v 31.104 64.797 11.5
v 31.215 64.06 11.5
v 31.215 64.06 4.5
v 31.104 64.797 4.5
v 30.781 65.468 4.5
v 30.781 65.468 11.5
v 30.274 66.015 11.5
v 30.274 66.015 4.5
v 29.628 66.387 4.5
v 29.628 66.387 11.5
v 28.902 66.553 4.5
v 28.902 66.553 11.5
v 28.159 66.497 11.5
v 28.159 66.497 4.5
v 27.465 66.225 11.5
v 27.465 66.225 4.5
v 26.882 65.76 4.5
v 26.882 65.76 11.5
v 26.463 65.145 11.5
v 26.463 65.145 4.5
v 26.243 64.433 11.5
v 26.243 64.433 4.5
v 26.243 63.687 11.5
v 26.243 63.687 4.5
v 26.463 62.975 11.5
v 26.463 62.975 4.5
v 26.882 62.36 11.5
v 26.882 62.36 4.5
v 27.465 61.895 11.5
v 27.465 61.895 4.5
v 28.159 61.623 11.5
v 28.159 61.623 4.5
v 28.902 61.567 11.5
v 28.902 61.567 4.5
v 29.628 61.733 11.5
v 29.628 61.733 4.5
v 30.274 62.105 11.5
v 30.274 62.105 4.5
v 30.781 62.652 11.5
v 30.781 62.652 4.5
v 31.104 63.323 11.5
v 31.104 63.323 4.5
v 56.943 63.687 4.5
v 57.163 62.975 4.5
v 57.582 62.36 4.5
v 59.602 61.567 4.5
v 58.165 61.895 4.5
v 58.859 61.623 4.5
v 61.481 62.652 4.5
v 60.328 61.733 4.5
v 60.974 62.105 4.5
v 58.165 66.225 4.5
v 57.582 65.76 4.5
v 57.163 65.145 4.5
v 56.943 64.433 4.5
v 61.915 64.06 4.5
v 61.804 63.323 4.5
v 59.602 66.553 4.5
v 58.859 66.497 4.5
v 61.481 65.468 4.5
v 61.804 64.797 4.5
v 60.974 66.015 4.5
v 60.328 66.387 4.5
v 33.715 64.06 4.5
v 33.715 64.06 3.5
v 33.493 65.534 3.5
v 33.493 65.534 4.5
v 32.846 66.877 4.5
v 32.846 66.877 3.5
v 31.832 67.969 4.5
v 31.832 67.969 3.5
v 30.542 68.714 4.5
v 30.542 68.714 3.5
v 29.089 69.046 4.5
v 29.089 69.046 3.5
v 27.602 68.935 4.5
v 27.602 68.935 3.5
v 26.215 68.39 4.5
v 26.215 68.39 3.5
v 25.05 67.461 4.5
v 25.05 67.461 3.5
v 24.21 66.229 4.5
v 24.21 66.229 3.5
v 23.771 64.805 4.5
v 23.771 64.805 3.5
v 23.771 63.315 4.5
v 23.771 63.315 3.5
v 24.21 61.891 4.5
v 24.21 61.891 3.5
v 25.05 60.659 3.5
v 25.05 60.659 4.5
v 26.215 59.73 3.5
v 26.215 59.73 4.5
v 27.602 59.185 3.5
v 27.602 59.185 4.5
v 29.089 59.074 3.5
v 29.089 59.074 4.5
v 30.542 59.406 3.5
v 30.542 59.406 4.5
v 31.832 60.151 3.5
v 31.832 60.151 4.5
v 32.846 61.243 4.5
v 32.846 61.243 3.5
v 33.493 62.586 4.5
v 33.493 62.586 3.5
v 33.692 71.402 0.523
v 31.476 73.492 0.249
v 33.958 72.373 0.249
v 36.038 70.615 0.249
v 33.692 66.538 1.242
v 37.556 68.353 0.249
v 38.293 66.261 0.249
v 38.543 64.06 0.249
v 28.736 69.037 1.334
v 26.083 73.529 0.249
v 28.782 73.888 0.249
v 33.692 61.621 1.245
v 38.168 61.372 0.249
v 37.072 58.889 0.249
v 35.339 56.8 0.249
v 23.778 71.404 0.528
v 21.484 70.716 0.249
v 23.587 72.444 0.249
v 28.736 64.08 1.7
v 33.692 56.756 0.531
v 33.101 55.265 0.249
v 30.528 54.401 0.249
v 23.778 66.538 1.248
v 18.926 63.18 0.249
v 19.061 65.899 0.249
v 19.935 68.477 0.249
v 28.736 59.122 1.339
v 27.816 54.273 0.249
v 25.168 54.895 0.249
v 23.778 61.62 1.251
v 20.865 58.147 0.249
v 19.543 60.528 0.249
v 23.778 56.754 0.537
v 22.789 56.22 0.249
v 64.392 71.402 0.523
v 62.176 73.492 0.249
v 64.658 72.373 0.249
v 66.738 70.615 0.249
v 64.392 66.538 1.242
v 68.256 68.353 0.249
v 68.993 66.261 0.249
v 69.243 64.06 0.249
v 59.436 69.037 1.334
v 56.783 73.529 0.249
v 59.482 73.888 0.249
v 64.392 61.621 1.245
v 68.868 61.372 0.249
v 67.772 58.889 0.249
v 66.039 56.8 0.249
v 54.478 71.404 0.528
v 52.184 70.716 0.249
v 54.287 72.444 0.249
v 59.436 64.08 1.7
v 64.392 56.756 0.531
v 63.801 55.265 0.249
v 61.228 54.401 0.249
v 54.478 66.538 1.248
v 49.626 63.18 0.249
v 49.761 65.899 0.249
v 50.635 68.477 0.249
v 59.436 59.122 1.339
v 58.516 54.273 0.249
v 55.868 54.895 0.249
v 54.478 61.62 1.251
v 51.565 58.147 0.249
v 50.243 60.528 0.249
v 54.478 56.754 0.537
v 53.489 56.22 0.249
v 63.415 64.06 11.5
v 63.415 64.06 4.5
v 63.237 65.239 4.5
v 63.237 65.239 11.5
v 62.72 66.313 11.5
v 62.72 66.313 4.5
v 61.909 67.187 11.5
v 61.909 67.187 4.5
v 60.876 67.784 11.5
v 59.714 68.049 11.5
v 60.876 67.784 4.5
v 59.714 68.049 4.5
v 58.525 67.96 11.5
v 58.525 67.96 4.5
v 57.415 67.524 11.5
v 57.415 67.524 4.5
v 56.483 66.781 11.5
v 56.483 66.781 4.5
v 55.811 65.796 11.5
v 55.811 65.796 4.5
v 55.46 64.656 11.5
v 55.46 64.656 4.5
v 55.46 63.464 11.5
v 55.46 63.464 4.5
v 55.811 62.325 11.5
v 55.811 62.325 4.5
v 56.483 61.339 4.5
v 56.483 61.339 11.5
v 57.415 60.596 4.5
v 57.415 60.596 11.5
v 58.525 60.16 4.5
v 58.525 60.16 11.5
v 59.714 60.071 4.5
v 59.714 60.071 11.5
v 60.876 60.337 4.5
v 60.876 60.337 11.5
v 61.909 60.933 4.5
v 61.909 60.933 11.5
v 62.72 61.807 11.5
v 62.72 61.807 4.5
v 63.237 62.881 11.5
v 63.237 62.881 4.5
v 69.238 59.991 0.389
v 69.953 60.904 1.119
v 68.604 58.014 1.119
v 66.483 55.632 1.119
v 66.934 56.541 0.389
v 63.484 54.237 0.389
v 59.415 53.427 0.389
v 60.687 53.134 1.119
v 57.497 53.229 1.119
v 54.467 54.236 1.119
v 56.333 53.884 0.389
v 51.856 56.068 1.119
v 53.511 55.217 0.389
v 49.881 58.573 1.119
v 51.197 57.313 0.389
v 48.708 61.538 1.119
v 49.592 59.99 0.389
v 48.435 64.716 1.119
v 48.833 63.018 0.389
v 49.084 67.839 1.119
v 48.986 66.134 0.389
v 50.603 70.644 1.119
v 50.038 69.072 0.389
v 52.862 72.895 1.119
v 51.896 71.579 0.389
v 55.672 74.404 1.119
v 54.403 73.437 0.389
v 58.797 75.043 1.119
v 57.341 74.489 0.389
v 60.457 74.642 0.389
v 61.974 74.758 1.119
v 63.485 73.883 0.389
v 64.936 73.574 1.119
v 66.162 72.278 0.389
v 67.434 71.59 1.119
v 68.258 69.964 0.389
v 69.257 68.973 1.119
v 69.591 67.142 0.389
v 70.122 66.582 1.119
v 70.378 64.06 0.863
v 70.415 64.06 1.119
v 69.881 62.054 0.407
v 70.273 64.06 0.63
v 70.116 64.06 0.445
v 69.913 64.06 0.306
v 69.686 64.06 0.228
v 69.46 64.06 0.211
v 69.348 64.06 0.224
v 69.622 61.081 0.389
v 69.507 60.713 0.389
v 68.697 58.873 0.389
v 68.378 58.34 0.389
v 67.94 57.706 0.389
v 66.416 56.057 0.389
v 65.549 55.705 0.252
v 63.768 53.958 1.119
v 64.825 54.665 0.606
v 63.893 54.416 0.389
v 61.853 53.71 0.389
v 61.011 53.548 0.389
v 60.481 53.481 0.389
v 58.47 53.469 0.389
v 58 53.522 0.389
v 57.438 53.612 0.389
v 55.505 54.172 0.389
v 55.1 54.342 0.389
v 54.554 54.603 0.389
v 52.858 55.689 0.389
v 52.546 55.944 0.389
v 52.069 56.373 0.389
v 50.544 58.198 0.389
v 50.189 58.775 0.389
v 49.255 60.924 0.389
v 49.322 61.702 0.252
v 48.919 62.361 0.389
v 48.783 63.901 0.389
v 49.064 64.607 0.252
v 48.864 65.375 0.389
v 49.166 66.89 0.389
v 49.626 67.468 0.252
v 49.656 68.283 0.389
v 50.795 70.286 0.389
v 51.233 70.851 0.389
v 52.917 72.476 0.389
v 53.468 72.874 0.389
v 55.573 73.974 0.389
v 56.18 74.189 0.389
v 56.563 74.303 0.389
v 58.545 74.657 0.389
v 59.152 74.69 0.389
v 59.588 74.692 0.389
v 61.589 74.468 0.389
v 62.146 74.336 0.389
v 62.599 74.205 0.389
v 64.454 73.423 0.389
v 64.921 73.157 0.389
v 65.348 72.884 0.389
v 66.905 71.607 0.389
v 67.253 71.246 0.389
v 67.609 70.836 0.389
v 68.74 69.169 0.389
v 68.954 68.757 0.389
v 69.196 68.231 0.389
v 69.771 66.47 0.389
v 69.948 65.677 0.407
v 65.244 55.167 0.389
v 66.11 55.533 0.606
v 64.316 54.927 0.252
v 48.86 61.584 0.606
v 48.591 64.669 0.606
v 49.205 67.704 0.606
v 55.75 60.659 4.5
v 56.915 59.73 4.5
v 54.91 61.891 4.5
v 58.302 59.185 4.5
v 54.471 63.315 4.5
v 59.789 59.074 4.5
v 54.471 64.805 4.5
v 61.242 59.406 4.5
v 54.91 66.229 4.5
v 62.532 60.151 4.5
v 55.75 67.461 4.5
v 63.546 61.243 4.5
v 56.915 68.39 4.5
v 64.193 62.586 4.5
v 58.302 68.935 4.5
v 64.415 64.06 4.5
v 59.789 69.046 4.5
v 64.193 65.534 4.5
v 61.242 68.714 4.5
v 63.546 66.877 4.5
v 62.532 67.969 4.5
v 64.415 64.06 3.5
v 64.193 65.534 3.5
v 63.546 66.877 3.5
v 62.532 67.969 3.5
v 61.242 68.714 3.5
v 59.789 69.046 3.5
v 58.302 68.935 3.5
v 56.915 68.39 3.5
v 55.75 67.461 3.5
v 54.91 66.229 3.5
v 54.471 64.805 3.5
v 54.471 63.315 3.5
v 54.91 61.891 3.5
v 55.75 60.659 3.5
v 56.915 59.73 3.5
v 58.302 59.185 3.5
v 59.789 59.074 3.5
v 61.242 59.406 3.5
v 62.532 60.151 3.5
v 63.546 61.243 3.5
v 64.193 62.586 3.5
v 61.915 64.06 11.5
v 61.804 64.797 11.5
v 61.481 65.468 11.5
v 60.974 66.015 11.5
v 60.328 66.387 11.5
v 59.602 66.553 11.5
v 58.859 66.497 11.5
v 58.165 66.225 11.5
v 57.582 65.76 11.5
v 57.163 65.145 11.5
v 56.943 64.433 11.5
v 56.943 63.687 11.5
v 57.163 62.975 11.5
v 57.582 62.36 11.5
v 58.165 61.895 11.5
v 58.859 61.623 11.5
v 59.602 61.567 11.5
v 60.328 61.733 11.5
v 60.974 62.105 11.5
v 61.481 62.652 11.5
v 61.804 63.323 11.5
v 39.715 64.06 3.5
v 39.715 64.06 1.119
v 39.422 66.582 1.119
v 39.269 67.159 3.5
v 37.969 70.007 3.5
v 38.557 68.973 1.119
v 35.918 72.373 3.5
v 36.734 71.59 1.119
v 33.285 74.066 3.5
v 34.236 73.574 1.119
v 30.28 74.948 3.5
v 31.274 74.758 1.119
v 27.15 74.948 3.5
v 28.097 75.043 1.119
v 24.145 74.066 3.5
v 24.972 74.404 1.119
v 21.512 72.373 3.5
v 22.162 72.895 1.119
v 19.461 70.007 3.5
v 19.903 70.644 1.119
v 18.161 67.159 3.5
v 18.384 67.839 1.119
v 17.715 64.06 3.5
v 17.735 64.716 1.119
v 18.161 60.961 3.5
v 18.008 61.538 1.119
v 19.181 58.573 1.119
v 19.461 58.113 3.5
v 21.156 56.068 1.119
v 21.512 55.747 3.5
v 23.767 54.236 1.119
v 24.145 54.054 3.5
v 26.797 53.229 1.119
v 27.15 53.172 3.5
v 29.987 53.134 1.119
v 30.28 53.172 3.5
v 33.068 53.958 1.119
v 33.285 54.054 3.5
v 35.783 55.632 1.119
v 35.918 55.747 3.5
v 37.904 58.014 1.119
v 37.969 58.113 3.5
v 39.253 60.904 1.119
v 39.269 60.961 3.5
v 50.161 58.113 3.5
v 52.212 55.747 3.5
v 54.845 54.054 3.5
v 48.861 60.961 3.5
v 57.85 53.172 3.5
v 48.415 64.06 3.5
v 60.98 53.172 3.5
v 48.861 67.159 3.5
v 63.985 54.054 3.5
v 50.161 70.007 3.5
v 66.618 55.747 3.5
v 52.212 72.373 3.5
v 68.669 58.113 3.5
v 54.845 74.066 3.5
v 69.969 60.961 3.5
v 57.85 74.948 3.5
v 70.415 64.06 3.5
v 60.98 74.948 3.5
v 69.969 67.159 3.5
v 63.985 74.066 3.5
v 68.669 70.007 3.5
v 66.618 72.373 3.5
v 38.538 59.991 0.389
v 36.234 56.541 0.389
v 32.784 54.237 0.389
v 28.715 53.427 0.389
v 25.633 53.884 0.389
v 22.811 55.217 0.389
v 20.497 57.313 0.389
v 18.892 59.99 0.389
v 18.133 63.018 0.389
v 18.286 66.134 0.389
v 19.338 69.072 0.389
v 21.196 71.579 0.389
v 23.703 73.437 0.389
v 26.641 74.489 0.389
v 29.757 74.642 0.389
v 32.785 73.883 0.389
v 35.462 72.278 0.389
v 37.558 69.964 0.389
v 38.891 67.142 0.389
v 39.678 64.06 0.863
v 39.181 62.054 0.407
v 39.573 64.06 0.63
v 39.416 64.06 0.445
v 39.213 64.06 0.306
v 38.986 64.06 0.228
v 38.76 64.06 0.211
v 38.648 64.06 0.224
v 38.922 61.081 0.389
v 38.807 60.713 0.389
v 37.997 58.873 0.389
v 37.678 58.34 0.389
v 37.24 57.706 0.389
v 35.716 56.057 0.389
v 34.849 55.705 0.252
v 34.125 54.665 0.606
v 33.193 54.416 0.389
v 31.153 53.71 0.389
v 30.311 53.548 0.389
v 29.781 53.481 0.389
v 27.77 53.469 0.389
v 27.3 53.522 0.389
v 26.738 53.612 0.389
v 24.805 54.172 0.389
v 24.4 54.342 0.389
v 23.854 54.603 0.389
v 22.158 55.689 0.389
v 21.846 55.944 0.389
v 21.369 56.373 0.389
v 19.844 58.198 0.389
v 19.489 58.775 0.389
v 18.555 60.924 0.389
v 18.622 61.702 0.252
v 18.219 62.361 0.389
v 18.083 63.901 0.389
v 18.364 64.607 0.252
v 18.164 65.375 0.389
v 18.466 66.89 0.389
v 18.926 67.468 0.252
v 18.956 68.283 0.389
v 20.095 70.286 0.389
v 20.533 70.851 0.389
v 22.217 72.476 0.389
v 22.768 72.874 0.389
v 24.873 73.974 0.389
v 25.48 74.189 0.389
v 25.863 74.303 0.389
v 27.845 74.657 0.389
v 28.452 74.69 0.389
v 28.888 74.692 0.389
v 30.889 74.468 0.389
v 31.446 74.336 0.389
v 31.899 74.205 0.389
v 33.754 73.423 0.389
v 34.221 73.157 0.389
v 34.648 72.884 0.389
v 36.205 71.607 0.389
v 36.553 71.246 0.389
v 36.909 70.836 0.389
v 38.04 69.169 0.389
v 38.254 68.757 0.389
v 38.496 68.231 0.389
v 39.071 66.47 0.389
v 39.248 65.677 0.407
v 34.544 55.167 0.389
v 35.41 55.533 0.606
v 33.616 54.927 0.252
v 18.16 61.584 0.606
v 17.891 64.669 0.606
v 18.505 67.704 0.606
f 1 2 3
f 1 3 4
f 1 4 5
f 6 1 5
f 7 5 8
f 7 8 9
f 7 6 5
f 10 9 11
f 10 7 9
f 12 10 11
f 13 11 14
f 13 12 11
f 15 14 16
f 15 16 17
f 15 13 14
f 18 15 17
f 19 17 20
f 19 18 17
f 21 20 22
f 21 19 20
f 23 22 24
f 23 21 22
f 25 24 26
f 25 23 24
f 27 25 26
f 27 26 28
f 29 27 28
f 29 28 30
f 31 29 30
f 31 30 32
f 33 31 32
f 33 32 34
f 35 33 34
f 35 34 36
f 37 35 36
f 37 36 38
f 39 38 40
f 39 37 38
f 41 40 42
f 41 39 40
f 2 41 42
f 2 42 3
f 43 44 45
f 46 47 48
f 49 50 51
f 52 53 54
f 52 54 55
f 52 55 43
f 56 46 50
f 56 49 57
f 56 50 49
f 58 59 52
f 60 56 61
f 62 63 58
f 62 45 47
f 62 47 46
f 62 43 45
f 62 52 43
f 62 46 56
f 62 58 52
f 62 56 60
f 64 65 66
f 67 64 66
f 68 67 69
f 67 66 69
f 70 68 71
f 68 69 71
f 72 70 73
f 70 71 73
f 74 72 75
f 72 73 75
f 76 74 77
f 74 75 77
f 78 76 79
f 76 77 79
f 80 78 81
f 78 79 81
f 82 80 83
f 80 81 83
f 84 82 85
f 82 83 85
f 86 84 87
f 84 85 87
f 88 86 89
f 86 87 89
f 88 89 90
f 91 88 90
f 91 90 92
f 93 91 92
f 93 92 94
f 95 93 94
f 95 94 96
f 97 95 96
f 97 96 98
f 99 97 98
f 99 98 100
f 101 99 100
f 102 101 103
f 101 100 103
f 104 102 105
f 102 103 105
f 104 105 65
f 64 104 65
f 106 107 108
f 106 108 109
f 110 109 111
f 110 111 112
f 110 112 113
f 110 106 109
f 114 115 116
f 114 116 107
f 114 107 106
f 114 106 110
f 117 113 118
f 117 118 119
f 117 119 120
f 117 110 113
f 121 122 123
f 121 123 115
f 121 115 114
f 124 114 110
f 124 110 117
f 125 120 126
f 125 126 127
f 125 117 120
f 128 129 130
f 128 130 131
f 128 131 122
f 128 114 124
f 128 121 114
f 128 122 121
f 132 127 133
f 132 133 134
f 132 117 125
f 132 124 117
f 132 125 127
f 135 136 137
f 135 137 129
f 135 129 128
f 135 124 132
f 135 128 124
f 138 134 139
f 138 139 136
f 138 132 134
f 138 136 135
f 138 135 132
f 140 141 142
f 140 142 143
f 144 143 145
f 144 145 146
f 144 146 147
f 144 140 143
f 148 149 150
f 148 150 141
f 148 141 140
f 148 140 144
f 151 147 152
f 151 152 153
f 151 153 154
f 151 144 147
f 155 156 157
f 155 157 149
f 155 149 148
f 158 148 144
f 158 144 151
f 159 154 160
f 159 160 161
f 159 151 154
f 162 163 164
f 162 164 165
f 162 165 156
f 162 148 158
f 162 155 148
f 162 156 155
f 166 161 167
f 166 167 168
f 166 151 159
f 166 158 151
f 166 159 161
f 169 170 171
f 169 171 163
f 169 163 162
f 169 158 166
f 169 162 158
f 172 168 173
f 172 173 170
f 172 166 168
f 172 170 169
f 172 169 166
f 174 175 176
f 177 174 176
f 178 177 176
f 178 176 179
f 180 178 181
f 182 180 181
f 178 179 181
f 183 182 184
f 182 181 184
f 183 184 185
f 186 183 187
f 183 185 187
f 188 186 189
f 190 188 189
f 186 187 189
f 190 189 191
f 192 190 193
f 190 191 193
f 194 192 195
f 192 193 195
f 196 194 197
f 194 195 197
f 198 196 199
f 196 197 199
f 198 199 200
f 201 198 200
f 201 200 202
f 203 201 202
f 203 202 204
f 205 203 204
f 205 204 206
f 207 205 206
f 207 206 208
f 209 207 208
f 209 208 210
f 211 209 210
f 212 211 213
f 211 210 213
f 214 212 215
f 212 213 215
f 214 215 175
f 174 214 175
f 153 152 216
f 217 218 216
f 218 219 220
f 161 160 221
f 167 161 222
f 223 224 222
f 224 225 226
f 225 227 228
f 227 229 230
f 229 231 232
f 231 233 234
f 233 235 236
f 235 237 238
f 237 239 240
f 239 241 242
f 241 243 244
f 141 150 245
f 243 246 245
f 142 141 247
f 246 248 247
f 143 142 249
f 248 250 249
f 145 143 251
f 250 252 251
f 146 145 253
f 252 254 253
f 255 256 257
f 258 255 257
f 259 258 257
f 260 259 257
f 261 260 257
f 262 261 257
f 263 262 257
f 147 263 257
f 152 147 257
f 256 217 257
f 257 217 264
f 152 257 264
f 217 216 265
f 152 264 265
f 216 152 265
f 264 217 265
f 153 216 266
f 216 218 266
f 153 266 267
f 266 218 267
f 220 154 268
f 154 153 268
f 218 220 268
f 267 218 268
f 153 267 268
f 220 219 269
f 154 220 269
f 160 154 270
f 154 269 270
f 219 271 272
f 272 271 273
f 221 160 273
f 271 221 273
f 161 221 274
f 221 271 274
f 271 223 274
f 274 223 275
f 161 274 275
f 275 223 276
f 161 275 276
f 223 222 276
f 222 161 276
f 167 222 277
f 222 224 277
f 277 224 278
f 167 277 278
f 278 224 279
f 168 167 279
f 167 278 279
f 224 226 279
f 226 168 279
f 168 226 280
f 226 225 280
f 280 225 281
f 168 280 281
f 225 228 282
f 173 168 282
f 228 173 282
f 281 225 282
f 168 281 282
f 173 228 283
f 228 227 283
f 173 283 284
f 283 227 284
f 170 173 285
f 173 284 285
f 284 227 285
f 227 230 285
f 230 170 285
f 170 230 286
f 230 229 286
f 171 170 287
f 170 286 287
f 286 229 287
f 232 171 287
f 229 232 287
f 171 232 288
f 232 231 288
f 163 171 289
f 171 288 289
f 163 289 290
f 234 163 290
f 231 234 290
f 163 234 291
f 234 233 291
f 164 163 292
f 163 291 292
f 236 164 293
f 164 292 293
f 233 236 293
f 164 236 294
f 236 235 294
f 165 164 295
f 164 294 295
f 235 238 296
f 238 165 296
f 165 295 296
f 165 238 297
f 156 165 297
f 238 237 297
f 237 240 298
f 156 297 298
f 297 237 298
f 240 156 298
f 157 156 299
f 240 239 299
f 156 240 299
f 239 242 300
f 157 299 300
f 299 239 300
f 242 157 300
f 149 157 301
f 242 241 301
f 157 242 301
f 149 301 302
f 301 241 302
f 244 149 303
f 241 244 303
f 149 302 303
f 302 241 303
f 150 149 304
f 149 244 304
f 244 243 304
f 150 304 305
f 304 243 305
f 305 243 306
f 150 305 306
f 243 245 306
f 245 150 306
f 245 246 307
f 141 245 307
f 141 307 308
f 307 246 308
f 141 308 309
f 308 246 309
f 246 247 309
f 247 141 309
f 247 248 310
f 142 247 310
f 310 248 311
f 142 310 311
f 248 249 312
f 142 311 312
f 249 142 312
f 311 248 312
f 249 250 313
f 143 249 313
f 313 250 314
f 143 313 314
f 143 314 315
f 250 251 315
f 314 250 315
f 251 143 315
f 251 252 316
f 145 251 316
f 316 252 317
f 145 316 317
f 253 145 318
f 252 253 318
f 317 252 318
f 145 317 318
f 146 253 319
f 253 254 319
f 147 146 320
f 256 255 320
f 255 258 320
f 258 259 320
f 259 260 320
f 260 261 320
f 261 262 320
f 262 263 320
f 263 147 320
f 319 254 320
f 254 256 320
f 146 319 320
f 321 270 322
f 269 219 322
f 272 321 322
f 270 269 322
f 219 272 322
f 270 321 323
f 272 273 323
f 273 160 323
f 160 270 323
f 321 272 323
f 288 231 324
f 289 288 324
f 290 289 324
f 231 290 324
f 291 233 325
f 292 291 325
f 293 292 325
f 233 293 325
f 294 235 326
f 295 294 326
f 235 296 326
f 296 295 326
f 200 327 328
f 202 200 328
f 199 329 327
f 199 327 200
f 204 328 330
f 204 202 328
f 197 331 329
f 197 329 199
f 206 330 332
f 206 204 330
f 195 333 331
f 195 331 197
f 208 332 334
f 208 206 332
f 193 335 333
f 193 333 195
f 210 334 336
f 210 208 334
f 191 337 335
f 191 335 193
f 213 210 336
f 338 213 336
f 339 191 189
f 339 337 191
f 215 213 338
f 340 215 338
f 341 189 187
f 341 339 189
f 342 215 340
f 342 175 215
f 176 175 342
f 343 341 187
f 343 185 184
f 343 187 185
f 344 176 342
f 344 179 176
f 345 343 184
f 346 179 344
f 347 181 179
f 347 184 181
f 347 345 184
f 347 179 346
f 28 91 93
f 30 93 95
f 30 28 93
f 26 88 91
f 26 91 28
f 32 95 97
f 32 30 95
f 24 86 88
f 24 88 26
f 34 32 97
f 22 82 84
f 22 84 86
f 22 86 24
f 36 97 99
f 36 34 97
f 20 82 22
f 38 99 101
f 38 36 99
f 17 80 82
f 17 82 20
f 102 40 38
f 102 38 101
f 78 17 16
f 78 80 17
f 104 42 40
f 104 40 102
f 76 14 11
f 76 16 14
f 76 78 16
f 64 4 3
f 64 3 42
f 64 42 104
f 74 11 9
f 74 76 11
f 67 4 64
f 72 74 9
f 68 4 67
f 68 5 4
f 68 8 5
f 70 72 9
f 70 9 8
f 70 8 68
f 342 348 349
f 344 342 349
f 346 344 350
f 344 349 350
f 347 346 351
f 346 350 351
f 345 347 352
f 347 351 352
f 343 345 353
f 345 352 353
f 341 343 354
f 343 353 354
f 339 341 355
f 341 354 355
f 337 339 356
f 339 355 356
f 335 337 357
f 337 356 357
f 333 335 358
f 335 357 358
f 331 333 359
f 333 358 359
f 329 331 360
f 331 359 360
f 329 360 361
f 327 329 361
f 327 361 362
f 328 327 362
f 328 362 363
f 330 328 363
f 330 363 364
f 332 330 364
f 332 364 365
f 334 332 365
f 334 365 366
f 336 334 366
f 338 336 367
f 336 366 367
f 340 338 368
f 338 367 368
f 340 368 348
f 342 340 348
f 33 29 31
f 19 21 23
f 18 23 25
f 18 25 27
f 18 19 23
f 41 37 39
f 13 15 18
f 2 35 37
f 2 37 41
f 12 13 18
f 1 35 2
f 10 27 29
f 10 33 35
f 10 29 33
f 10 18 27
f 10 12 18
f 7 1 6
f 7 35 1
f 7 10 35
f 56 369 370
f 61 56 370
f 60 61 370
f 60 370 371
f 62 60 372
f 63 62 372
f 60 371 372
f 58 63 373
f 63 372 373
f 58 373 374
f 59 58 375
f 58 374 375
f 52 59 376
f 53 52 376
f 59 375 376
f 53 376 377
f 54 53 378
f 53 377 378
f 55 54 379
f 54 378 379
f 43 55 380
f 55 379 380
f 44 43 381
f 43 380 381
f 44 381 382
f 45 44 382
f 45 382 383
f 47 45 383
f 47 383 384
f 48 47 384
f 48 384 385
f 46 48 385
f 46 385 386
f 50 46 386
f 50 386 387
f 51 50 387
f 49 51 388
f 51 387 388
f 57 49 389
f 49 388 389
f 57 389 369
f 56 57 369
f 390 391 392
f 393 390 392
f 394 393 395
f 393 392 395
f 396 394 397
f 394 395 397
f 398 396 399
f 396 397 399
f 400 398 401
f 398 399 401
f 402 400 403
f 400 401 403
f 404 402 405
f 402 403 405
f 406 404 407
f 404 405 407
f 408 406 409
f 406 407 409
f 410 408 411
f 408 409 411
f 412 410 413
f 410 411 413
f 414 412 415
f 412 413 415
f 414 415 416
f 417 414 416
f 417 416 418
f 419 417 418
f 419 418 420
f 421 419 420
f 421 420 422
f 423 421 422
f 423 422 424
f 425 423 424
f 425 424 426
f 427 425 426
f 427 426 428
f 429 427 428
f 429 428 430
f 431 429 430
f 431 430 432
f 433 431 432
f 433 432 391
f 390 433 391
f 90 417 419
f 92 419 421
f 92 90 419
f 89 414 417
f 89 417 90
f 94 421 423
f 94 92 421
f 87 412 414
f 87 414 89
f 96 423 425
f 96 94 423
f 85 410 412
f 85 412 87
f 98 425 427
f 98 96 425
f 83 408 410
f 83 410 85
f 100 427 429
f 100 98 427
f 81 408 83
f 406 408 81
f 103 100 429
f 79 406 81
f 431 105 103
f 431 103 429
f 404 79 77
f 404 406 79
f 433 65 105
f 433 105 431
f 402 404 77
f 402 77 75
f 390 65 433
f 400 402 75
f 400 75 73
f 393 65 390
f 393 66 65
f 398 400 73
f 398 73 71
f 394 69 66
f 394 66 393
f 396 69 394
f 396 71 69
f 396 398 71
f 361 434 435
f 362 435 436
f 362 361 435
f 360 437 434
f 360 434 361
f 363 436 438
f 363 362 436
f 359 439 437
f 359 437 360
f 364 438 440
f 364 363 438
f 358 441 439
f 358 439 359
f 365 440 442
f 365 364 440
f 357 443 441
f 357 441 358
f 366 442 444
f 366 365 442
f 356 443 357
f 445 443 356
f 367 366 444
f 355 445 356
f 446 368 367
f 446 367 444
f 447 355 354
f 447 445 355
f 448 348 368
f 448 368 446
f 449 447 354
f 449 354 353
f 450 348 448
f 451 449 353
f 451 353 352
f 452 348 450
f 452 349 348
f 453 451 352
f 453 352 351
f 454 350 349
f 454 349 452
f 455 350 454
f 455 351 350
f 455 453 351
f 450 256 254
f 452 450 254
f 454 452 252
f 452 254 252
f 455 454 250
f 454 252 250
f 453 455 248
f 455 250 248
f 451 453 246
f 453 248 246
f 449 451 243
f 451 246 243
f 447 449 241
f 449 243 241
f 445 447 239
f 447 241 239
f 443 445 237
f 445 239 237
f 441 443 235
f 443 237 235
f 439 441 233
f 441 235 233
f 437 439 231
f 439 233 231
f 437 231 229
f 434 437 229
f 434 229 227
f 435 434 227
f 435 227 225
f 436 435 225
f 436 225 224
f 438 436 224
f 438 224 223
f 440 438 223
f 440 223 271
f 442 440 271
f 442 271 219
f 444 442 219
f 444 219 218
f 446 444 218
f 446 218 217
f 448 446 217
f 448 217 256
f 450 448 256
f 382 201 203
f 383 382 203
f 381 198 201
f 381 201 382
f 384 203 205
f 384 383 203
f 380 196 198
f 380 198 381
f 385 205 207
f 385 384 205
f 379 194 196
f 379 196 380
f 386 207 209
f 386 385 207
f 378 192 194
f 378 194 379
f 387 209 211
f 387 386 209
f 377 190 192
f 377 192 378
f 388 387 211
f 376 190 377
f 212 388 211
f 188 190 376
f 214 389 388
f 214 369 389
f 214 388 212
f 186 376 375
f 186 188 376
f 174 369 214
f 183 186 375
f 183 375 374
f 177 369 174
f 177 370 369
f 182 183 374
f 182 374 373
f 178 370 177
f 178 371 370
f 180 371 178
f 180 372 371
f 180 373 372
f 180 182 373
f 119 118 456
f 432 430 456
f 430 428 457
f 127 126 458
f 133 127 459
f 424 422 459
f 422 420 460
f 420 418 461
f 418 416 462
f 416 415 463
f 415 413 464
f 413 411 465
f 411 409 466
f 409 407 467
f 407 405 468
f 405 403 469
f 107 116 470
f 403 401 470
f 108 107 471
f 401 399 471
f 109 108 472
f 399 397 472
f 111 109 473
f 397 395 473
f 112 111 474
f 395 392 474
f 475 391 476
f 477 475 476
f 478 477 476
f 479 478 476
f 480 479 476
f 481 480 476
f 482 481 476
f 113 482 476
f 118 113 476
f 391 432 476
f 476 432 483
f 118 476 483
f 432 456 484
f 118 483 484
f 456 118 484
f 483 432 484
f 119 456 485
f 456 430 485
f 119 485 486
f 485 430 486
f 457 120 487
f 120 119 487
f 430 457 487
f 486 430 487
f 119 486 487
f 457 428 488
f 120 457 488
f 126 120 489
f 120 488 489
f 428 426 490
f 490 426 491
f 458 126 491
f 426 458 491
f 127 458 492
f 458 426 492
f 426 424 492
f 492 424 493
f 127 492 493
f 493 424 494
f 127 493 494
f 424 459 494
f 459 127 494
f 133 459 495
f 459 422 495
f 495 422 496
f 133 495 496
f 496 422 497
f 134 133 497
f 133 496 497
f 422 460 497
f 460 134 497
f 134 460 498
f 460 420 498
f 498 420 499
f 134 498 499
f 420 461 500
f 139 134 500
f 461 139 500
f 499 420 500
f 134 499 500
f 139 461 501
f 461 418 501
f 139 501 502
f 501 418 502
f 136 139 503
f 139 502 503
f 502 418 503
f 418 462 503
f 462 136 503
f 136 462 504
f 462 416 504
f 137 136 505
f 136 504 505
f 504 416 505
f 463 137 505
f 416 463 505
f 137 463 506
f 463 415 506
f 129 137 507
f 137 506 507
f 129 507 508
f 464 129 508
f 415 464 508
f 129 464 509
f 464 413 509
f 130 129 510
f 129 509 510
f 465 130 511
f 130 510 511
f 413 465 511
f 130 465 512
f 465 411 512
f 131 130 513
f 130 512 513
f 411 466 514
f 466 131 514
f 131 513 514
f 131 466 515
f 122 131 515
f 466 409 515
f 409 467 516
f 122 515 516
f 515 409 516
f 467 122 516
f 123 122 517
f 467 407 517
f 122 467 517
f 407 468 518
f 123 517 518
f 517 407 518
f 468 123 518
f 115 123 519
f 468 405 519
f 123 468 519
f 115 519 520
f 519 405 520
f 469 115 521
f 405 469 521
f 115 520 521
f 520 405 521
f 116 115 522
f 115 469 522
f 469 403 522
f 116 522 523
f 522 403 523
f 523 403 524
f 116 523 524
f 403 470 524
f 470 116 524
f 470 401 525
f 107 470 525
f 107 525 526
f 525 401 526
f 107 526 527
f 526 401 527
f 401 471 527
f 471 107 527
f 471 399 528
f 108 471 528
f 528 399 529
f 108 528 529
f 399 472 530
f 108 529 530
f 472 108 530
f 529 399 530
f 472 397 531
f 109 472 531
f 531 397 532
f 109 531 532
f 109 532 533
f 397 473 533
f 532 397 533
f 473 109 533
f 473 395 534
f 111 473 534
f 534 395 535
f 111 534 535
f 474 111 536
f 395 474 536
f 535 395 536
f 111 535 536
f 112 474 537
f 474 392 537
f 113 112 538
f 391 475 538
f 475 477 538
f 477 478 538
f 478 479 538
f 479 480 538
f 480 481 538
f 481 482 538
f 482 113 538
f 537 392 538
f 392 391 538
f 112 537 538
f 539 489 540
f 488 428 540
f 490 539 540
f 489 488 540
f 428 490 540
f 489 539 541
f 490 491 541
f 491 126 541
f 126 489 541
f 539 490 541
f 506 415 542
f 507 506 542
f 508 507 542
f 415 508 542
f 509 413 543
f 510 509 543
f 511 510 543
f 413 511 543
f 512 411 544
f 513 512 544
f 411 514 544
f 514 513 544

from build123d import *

# Parameters (mm, degrees)
F0_R      = 11
F1_DEPTH  = 3.5
F2_R      = 5
F3_DEPTH  = 1
F4_R      = 4
F5_DEPTH  = 7
F6_R      = 1.3518679975
F7_DEPTH  = 32.3
F11_R     = 0.9092071391
F13_R     = 2.5
F14_DEPTH = 7
F15_R     = 4
F15_R_2   = 2.5
F16_DEPTH = 7


# Not quite as in the source:
# - a fillet or chamfer that OpenCascade refuses, or shapes differently, is made with other operations: its cross-section is extruded or revolved along the edge and cut away or added
# - a feature names something its author has since deleted; it is built from what else it names


with BuildPart() as f1:
    # F0 (on Top) → F1 (new body)
    with BuildSketch(Plane.XY):
        with Locations((59.4149753451, 64.0600547194)):
            Circle(F0_R)
    extrude(amount=F1_DEPTH)

    # F2 (on face) → F3 (join)
    with BuildSketch(Plane.XY.offset(3.5)):
        with Locations((59.4149753451, 64.0600547194)):
            Circle(F2_R)
    extrude(amount=F3_DEPTH)

    # F4 (on face) → F5 (join)
    with BuildSketch(Plane.XY.offset(4.5)):
        with Locations((59.4149753451, 64.0600547194)):
            Circle(F4_R)
    extrude(amount=F5_DEPTH)

    # F6 (on face) → F7 (join)
    with BuildSketch(Plane(origin=(0, 0, 0), x_dir=(1, 0, 0), z_dir=(0, 0, -1))):
        with Locations((59.4149753451, -64.0600547194)):
            Circle(F6_R)
    extrude(amount=F7_DEPTH)

    # F8 (on face) → F9 (revolve, cut)
    with BuildSketch(Plane(origin=(0, 0, -32.3), x_dir=(1, 0, 0), z_dir=(0, 0, -1))):
        with BuildLine():
            Line((60.7668433426, -64.0600547194), (93.4149753451, -64.0600547194))
            ThreePointArc((93.4149753451, -64.0600547194), (59.4149753451, -30.0600547194), (25.4149753451, -64.0600547194))
            Line((25.4149753451, -64.0600547194), (58.0631073476, -64.0600547194))
            ThreePointArc((58.0631073476, -64.0600547194), (59.4149753451, -62.7081867219), (60.7668433426, -64.0600547194))
        make_face()
        with BuildLine():
            Line((59.4149753451, -64.0600547194), (60.7668433426, -64.0600547194))
            ThreePointArc((60.7668433426, -64.0600547194), (59.4149753451, -62.7081867219), (58.0631073476, -64.0600547194))
            Line((58.0631073476, -64.0600547194), (59.4149753451, -64.0600547194))
        make_face()
    revolve(axis=Axis((76.4149753451, 64.0600547194, -32.3), (1, 0, 0)), mode=Mode.SUBTRACT)

    # F10: fillet of radius 5 on 1 edges, made by hand

    # F10_s1 → F10_t2 (revolve, cut)
    with BuildSketch(Plane.YZ.offset(59.4149753451)):
        with BuildLine():
            ThreePointArc((52.67102491, 0), (53.4091792265, 0.0547873448), (54.1311569369, 0.2179487179))
            ThreePointArc((54.1311569369, 0.2179487179), (53.7867795374, 0.1107978463), (53.4435581222, 0))
            Line((53.4435581222, 0), (52.67102491, 0))
        make_face()
    revolve(axis=Axis((59.4149753451, 64.0600547194, 0), (0, 0, 1)), mode=Mode.SUBTRACT)

    # F11
    f11_edges = [f1.edges().sort_by_distance(p)[0] for p in [
        (51.636801, 71.838229, 0.015157),
        (67.19315, 56.28188, 0.015157),
    ]]
    fillet(f11_edges, radius=F11_R)


with BuildPart() as f12_1:
    # F12: copy of F1
    add(f1.part.moved(Location((-30.7, 0, 0))))

    # F15 (on face) → F16 (cut)
    with BuildSketch(Plane.XY.offset(11.5)):
        with Locations((28.7149753451, 64.0600547194)):
            Circle(F15_R)
        with Locations((28.7149753451, 64.0600547194)):
            Circle(F15_R_2, mode=Mode.SUBTRACT)
    extrude(amount=-F16_DEPTH, mode=Mode.SUBTRACT)


with BuildPart() as f1_1:
    add(f1.part)

    # F13 (on face) → F14 (cut)
    with BuildSketch(Plane.XY.offset(11.5)):
        with Locations((59.4149753451, 64.0600547194)):
            Circle(F13_R)
    extrude(amount=-F14_DEPTH, mode=Mode.SUBTRACT)


solid = Compound([f12_1.part, f1_1.part])
